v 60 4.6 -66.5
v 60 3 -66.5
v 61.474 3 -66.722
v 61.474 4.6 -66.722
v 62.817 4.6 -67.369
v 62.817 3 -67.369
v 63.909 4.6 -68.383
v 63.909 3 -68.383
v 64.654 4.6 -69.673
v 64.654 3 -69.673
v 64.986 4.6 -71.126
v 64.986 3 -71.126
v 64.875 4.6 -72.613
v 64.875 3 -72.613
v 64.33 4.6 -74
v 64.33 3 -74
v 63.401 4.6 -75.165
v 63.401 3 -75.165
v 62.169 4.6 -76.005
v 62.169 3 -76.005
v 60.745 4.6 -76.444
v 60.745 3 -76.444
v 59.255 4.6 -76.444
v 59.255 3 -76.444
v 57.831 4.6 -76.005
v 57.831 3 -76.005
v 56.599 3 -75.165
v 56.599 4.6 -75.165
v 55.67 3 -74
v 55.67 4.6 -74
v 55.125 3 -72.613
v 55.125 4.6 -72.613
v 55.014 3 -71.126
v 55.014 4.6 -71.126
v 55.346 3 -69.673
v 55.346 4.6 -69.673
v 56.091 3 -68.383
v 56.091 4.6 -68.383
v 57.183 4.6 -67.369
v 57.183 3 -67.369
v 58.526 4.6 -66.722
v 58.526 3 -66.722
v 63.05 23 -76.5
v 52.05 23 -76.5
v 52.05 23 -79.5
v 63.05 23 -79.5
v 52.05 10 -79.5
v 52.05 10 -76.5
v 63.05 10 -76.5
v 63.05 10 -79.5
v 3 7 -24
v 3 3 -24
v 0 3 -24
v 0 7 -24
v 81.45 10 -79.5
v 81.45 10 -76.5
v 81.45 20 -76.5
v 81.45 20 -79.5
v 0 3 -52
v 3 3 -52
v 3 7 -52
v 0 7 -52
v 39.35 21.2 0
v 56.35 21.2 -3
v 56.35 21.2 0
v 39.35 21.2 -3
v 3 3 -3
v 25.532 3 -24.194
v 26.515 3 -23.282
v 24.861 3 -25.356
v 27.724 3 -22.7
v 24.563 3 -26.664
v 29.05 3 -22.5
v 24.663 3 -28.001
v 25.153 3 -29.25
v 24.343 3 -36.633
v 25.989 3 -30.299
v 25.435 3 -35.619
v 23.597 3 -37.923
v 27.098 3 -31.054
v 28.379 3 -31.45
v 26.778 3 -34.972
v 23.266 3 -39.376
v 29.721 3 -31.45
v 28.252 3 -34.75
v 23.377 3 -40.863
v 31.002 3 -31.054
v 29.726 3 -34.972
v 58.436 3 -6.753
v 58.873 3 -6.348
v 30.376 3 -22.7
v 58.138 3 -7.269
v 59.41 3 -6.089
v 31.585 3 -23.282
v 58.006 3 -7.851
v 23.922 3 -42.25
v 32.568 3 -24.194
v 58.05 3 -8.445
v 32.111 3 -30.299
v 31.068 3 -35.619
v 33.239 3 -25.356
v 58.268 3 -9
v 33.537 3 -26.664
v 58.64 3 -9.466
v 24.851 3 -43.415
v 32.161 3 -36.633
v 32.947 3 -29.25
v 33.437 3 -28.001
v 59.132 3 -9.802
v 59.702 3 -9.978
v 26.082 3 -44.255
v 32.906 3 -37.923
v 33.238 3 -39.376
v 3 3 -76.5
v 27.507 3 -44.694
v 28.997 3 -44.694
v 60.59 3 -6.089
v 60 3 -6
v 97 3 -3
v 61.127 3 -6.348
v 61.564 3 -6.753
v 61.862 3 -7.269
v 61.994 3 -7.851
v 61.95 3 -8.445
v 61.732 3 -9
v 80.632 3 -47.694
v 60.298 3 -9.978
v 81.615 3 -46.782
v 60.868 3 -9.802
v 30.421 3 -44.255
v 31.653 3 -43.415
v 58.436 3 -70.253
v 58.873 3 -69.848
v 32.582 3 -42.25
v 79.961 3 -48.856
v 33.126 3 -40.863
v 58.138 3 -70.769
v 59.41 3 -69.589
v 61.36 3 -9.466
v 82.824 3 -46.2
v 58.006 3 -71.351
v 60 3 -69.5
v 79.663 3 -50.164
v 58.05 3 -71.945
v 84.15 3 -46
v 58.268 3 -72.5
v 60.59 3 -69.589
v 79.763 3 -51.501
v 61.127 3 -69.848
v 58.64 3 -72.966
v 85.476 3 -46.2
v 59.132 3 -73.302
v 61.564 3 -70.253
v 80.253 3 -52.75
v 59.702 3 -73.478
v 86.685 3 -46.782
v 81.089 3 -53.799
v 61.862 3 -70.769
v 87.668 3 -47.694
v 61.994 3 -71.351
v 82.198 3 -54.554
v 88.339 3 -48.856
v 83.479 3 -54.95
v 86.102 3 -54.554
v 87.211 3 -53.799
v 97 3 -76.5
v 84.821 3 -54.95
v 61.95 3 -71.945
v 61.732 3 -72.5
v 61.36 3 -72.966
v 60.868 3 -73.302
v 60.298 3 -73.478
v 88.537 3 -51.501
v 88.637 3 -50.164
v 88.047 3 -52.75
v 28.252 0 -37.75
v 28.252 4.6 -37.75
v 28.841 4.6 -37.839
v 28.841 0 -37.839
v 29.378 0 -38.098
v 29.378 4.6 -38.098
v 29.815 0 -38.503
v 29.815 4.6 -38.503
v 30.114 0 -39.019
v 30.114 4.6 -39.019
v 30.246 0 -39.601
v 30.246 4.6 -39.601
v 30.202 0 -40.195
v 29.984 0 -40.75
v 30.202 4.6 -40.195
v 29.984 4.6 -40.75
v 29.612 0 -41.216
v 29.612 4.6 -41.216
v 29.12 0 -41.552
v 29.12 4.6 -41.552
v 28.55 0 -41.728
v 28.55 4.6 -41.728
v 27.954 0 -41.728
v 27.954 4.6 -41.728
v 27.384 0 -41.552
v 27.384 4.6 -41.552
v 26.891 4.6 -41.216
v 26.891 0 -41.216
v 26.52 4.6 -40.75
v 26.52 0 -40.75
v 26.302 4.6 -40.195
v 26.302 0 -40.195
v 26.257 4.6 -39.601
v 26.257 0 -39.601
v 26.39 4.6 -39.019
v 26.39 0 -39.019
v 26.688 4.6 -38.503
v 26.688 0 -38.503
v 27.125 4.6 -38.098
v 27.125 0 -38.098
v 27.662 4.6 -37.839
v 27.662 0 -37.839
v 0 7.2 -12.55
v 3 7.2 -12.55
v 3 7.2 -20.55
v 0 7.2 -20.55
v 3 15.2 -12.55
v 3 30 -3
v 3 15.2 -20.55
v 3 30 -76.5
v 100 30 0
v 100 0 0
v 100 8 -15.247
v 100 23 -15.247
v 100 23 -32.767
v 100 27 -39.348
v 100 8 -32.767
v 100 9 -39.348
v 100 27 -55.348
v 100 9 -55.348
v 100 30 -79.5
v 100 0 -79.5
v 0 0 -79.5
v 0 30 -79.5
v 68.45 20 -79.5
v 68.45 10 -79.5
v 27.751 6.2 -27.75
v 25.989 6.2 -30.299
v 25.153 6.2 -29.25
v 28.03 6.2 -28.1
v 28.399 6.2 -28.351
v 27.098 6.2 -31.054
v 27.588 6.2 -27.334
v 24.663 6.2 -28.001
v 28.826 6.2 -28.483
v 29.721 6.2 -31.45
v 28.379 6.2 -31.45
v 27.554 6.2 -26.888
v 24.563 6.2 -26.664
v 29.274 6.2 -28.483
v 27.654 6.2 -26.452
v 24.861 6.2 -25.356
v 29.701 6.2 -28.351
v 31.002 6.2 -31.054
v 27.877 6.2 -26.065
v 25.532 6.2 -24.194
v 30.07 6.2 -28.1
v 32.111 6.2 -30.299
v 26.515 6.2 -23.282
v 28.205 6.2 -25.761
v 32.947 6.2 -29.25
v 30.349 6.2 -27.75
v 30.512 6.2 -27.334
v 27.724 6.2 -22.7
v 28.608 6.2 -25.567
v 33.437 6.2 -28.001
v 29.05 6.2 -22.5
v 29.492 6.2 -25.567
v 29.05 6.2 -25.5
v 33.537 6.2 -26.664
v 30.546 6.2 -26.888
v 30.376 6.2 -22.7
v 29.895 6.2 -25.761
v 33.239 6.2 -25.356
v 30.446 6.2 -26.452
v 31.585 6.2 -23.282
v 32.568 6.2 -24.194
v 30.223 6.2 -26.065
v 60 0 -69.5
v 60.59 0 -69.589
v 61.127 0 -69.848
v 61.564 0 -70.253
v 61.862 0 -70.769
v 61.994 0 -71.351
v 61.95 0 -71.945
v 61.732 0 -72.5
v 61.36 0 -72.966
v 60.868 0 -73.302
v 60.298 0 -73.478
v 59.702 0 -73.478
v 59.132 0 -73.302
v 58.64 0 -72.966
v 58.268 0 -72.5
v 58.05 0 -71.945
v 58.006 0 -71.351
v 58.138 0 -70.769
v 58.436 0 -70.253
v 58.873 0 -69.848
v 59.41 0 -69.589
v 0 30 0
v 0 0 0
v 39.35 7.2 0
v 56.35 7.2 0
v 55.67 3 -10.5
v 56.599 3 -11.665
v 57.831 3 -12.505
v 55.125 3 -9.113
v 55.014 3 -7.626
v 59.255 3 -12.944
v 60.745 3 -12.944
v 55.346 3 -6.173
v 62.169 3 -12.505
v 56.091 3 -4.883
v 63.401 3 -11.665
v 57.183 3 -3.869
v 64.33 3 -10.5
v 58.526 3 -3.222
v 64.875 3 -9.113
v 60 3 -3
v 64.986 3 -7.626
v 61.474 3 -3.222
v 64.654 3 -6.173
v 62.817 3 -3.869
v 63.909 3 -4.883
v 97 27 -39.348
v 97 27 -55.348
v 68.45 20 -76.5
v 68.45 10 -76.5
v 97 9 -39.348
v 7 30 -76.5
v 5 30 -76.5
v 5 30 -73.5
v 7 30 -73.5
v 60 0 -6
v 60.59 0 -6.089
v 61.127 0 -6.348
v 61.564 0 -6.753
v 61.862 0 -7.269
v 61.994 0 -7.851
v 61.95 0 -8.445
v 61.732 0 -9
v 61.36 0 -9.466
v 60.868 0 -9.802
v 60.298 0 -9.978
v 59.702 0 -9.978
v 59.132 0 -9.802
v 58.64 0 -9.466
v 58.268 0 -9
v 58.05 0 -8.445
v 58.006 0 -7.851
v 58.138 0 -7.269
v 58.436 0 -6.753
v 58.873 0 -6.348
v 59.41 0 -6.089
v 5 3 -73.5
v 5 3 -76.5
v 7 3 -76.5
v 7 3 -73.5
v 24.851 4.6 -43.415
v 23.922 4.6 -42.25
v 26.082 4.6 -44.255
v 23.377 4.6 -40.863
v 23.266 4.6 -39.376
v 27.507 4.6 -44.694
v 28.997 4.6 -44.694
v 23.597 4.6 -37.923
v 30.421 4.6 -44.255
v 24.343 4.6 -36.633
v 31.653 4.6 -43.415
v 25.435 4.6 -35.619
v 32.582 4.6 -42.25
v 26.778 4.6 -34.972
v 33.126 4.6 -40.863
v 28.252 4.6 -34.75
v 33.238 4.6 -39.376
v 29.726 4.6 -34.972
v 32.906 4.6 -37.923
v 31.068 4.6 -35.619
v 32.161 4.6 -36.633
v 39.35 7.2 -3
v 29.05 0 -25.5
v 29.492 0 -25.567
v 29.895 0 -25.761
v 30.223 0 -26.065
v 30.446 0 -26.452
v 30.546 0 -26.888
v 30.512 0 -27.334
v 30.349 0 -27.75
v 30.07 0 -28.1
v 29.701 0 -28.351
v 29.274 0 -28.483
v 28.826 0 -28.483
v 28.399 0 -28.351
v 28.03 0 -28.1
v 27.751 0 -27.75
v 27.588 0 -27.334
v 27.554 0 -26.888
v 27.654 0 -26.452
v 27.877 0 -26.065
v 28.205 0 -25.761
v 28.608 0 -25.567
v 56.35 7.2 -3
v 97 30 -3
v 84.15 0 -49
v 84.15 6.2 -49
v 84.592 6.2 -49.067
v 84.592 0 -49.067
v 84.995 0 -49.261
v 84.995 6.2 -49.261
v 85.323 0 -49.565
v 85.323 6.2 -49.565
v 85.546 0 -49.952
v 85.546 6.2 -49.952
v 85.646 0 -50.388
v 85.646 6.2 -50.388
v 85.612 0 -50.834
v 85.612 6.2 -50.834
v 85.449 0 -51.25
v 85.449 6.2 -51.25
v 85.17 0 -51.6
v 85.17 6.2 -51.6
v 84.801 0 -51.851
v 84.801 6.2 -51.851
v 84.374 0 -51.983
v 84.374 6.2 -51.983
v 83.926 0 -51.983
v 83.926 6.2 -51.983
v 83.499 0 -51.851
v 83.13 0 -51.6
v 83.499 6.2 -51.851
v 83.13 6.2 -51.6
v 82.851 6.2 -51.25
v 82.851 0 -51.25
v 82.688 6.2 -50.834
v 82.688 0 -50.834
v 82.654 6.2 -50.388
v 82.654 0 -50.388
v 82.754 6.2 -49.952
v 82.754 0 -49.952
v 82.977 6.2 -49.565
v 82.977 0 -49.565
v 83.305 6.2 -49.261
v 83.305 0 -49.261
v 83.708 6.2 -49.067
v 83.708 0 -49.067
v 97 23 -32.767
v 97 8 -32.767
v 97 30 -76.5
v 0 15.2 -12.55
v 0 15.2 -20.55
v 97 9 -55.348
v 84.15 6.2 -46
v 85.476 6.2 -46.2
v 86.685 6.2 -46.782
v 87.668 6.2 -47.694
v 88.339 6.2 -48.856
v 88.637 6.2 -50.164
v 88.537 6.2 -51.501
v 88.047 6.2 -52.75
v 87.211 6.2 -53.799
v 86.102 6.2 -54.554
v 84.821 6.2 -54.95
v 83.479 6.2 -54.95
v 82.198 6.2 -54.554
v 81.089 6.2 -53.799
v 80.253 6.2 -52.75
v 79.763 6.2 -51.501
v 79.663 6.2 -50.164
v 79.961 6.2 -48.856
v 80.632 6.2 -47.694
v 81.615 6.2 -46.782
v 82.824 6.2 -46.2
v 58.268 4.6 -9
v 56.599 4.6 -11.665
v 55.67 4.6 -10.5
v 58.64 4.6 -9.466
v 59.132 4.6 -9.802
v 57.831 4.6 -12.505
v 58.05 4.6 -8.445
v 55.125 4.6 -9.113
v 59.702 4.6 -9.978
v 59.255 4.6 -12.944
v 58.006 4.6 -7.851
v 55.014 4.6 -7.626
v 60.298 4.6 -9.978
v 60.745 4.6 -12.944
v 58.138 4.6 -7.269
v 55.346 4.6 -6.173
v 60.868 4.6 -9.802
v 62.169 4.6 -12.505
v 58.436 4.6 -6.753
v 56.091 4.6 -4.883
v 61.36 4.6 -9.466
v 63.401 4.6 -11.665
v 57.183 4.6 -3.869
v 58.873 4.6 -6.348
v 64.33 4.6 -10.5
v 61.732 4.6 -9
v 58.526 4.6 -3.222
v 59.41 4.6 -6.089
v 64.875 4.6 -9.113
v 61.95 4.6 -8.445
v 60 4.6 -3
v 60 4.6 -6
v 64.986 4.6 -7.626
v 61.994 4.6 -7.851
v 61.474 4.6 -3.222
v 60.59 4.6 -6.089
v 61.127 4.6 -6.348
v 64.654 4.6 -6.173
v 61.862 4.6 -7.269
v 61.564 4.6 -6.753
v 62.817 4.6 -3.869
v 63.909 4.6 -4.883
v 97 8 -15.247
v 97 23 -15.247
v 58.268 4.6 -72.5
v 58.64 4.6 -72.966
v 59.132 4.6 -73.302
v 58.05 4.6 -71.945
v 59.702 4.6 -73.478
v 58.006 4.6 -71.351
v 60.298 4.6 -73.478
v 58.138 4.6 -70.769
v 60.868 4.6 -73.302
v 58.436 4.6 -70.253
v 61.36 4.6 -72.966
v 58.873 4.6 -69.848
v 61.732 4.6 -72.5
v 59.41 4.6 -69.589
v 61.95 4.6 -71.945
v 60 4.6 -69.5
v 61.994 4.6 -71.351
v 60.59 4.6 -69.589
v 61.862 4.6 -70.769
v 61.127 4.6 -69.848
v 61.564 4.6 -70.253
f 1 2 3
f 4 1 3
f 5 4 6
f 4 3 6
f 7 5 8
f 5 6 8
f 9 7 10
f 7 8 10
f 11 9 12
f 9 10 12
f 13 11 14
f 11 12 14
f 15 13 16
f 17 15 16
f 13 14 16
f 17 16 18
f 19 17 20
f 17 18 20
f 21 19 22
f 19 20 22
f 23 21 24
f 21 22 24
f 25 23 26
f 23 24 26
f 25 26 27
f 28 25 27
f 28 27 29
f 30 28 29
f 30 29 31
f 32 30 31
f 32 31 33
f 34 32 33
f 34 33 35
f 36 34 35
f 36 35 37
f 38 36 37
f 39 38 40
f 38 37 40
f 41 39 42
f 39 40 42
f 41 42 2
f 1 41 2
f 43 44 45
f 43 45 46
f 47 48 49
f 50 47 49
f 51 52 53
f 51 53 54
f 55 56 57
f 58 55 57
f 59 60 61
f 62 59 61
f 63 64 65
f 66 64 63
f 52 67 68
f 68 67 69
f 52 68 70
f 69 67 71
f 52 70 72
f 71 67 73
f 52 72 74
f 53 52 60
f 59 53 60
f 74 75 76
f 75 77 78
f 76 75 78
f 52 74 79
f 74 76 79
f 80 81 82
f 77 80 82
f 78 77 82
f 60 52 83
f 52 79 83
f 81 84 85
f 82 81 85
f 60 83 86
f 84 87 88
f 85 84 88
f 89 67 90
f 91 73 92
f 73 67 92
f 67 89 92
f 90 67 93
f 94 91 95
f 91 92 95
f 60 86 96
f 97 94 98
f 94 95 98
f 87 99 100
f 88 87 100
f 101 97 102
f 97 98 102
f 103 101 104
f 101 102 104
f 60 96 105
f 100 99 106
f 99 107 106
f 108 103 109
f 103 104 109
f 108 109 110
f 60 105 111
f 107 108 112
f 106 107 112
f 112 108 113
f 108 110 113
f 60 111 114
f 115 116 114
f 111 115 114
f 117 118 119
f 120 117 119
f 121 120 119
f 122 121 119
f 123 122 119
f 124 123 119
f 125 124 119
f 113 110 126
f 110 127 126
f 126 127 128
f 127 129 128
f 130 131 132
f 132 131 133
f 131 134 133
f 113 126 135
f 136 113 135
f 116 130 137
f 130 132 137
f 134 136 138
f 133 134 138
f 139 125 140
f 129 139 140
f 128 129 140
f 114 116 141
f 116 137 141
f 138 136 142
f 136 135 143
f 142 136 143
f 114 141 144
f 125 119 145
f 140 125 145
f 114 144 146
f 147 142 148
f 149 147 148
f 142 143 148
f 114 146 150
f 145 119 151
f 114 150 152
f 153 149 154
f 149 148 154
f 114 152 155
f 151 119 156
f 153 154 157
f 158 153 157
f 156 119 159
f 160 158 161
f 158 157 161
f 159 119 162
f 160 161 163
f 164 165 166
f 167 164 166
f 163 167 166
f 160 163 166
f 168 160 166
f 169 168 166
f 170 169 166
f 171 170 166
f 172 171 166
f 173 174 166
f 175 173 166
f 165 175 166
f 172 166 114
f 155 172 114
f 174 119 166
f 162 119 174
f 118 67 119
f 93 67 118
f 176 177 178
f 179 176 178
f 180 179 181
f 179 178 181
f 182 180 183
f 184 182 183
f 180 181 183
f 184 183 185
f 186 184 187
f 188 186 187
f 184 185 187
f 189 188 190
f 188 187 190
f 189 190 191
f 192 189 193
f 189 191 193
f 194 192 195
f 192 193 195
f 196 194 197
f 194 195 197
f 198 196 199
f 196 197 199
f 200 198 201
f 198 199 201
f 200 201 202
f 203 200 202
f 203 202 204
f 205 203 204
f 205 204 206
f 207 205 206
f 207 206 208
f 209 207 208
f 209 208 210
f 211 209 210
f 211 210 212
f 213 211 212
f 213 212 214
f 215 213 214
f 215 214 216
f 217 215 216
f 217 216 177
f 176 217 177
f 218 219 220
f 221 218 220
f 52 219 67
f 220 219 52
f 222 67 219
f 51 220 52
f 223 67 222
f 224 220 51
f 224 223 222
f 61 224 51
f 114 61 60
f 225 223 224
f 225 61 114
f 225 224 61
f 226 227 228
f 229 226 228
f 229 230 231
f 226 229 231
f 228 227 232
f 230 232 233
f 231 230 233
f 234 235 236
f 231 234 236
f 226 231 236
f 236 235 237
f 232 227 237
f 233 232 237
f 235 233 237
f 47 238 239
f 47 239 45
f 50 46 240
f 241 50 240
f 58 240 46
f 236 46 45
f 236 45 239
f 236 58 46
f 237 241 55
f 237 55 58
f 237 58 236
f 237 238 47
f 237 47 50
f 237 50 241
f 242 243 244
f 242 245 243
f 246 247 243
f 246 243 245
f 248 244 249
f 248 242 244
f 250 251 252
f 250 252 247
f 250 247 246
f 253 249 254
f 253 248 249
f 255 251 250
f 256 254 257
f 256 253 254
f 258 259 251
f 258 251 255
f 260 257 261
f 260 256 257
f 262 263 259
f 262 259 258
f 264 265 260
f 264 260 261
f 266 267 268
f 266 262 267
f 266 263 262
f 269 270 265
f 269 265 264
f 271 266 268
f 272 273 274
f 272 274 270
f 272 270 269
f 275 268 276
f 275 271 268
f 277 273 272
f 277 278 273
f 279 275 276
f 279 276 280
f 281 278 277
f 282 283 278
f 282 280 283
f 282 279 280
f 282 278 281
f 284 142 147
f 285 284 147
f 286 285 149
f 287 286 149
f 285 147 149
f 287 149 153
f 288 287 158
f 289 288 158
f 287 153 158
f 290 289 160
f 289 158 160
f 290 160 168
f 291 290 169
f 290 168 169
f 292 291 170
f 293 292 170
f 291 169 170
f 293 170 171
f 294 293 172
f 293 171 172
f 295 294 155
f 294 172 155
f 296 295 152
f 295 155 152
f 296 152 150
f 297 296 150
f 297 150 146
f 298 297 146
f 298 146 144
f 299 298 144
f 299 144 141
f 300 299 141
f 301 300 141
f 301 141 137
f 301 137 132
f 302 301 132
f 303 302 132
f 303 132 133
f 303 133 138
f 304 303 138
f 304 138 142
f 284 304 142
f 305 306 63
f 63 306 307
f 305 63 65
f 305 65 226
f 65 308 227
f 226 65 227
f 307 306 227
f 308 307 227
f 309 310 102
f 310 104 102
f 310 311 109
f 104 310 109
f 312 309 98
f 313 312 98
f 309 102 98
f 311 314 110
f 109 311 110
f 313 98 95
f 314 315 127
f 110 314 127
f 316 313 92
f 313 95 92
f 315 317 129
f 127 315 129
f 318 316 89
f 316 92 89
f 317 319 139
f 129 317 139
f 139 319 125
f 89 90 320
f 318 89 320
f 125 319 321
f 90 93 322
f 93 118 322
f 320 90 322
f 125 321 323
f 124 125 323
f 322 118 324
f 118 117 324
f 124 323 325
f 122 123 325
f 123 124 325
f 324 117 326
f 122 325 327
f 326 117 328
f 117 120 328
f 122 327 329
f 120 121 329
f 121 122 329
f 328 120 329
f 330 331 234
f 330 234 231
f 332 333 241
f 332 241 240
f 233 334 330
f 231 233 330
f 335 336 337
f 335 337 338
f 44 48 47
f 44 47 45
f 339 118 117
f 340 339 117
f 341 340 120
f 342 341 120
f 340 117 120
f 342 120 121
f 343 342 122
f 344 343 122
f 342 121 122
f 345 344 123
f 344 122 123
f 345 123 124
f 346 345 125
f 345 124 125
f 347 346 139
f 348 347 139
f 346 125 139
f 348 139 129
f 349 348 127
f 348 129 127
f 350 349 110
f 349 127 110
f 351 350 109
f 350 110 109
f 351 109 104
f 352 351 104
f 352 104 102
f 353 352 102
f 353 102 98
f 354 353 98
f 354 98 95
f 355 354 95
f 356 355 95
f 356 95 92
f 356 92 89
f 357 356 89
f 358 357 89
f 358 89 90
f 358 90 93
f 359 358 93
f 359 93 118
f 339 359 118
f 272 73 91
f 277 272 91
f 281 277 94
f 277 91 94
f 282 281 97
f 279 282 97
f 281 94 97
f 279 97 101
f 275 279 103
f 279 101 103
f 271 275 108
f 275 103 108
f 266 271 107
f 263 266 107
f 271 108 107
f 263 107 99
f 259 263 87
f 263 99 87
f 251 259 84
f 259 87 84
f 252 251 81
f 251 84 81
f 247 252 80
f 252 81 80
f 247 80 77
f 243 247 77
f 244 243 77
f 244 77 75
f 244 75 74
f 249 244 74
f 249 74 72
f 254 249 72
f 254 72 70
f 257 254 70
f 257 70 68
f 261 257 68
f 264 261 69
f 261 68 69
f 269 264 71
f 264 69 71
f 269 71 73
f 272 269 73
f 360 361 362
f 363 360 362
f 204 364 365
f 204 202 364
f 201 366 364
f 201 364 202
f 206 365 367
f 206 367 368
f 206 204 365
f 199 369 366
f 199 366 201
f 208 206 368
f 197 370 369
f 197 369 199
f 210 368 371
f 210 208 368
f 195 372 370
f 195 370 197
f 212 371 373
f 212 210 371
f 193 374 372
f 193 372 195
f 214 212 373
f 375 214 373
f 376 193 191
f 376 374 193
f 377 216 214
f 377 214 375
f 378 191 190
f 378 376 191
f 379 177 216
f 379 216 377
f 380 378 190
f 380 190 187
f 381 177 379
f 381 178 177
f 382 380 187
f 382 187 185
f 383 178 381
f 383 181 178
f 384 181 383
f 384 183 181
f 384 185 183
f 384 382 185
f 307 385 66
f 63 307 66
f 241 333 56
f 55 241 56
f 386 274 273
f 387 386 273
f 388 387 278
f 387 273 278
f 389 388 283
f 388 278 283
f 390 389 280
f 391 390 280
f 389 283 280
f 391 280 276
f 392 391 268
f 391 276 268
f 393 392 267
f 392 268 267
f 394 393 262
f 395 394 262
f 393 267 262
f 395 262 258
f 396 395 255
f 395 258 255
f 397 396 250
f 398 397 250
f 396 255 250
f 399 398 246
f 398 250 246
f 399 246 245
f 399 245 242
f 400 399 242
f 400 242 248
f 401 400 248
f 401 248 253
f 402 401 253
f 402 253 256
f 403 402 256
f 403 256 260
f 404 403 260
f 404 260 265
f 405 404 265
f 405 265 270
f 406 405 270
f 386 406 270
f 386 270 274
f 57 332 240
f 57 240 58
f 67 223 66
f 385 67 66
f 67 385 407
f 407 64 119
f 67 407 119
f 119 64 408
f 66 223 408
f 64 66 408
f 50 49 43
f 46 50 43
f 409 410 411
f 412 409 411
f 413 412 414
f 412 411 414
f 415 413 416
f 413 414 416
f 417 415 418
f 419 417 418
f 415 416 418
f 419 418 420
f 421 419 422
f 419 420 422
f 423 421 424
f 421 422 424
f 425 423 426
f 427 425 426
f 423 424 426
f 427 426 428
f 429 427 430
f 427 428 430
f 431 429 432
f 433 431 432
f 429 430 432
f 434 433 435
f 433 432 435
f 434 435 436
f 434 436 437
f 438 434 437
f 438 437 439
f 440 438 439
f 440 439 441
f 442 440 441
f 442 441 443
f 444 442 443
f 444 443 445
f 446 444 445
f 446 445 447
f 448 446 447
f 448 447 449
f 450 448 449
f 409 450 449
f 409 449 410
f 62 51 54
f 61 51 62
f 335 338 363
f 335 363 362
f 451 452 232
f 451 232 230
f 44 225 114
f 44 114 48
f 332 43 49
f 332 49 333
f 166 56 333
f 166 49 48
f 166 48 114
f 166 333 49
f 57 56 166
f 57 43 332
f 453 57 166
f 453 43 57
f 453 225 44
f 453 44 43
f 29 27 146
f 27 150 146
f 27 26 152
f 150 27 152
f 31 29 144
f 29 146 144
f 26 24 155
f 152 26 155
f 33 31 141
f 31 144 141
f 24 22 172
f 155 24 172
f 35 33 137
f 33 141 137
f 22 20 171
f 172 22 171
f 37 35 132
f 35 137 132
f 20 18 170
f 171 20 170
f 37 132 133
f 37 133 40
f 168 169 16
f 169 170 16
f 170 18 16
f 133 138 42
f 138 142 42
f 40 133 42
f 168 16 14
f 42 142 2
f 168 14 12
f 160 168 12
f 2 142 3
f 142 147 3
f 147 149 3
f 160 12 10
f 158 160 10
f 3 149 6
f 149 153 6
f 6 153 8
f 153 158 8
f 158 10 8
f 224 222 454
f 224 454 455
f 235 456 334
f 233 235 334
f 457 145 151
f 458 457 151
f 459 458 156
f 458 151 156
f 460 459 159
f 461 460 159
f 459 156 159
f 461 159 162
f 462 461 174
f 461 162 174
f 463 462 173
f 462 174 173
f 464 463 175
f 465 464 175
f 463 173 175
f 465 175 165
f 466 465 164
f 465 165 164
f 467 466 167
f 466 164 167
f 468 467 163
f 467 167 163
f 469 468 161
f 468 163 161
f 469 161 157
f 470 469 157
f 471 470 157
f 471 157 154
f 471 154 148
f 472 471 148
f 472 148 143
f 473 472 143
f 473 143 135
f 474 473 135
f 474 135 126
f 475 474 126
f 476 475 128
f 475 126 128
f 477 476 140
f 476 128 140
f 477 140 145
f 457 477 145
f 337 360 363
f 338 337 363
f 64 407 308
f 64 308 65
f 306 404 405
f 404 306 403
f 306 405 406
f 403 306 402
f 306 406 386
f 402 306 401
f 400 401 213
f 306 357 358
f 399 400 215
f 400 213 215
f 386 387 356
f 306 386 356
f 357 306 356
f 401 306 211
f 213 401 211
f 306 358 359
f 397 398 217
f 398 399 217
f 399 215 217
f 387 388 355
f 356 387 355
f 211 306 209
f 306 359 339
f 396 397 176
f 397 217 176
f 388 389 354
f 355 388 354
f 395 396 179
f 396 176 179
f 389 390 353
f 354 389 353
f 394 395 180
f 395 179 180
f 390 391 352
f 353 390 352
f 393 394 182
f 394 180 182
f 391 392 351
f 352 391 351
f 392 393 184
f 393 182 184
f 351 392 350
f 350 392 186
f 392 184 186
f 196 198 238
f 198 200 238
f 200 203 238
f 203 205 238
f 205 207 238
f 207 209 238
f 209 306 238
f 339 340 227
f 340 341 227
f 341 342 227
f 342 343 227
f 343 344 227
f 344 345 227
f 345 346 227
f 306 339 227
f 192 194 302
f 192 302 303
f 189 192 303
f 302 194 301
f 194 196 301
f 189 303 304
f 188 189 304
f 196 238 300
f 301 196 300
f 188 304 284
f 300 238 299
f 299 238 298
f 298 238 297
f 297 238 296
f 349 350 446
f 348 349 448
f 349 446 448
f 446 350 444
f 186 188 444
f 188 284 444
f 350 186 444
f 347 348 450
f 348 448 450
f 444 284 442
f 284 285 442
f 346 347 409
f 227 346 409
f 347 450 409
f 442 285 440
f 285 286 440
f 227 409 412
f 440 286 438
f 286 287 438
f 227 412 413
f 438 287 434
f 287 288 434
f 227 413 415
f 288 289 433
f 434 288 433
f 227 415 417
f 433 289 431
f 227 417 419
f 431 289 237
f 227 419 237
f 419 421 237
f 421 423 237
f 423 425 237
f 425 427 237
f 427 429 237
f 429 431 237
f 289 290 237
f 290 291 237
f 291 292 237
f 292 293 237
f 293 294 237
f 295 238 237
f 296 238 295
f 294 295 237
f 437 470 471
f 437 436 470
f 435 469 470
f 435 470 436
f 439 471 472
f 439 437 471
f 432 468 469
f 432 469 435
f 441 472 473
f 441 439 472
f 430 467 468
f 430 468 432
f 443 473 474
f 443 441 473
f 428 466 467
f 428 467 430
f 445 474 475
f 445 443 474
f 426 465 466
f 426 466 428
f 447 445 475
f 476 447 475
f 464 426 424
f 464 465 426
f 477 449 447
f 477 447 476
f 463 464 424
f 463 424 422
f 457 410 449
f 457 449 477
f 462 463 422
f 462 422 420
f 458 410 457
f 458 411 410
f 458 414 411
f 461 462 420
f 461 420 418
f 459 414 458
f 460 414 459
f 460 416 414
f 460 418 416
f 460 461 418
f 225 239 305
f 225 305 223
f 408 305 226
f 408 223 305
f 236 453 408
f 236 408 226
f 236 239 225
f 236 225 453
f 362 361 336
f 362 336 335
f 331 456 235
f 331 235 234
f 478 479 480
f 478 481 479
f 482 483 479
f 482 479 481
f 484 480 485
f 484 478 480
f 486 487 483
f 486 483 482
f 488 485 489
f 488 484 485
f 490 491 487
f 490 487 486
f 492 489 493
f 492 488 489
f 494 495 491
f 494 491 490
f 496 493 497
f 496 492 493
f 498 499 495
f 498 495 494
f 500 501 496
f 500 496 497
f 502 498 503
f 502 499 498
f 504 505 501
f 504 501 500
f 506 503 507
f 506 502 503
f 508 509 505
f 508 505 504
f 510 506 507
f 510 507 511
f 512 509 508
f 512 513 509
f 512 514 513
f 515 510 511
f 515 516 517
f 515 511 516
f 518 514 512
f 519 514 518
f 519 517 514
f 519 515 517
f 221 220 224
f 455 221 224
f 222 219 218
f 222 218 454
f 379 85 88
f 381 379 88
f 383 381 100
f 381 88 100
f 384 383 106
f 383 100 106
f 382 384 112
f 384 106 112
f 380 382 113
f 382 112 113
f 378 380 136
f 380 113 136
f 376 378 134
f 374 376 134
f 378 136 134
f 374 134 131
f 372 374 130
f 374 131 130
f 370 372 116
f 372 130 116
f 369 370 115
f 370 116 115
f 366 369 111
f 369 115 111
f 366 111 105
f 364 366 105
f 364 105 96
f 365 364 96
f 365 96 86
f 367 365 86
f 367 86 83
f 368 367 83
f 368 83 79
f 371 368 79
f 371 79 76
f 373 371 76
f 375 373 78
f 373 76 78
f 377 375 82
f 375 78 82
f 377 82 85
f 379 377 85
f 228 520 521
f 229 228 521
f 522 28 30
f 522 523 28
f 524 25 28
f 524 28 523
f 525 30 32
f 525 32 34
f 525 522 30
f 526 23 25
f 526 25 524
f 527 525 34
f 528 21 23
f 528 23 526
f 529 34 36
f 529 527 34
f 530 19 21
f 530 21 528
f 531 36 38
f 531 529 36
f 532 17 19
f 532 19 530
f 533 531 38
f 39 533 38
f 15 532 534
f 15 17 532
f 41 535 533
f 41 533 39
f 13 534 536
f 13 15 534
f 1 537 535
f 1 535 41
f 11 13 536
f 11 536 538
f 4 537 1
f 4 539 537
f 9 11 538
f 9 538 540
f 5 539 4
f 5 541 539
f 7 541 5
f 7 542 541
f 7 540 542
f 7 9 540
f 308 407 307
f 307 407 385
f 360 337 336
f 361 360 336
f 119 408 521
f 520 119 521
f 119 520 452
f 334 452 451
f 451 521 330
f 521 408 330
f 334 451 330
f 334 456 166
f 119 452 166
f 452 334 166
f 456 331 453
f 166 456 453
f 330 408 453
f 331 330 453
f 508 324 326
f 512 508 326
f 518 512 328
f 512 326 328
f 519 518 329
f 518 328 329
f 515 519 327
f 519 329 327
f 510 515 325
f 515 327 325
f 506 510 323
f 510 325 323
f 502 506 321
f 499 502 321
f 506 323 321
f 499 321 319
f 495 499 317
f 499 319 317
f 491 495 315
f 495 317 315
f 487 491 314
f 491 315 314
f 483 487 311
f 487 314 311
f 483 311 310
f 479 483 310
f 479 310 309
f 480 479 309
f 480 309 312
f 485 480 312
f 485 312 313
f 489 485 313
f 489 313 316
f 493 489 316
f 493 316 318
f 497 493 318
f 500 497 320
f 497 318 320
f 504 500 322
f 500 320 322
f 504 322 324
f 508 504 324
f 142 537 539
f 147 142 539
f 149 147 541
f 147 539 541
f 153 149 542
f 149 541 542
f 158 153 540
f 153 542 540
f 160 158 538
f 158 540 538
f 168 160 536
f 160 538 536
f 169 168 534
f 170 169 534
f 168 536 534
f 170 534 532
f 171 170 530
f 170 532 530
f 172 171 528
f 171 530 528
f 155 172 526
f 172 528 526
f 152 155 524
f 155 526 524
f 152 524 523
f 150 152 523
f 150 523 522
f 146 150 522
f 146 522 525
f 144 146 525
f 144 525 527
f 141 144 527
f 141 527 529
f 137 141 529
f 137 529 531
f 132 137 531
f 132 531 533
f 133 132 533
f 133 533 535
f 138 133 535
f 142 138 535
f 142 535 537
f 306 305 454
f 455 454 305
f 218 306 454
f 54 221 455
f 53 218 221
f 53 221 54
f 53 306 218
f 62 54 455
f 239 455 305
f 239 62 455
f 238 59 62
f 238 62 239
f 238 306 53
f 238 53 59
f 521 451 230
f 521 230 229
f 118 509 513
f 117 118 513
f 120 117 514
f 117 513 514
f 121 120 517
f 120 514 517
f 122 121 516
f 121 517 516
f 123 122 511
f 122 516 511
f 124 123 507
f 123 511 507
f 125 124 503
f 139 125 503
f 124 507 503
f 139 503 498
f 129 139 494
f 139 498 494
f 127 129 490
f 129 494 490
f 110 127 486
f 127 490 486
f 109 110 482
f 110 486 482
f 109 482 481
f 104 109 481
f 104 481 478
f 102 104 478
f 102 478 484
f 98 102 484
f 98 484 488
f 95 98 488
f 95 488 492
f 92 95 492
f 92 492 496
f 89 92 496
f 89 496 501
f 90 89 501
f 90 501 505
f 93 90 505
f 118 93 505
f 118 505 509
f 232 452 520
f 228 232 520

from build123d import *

# Parameters (mm, degrees)
SKETCH4_W             = 100
SKETCH4_H             = 79.5
BOSS_EXTRUDE3_DEPTH   = 30
SKETCH5_W             = 94
SKETCH5_H             = 73.5
CUT_EXTRUDE1_DEPTH    = 27
SKETCH9_R             = 5
BOSS_EXTRUDE5_DEPTH   = 1.6
BOSS_EXTRUDE5_2_DEPTH = 1.6
SKETCH10_R            = 2
CUT_EXTRUDE2_DEPTH    = 131.251333966
SKETCH11_R            = 2
CUT_EXTRUDE3_DEPTH    = 131.251333966
SKETCH12_R            = 4.5
BOSS_EXTRUDE6_DEPTH   = 3.2
SKETCH13_R            = 1.5
CUT_EXTRUDE4_DEPTH    = 130.948797609
SKETCH14_R            = 1.5
CUT_EXTRUDE5_DEPTH    = 130.948797609
SKETCH15_W            = 2
SKETCH15_H            = 3
BOSS_EXTRUDE7_DEPTH   = 27
SKETCH17_W            = 28
SKETCH17_H            = 4
CUT_EXTRUDE8_DEPTH    = 22.2
SKETCH18_W            = 8
SKETCH18_H            = 8
CUT_EXTRUDE9_DEPTH    = 22.2
SKETCH19_W            = 17
SKETCH19_H            = 14
CUT_EXTRUDE11_DEPTH   = 22.2
SKETCH20_R            = 5
BOSS_EXTRUDE8_DEPTH   = 1.6
SKETCH21_R            = 2
CUT_EXTRUDE12_DEPTH   = 131.251333966
SKETCH23_W            = 13
SKETCH23_H            = 10
SKETCH23_W_2          = 11
SKETCH23_H_2          = 13
CUT_EXTRUDE13_DEPTH   = 130.430483272
SKETCH24_W            = 16
SKETCH24_H            = 18
SKETCH24_W_2          = 17.520597446
SKETCH24_H_2          = 15
CUT_EXTRUDE15_DEPTH   = 129.954449322


with BuildPart() as part:
    # Sketch4 → Boss-Extrude3 (new body)
    with BuildSketch(Plane(origin=(0, 0, 0), x_dir=(1, 0, 0), z_dir=(0, 1, 0))):
        with Locations((50, 39.75)):
            Rectangle(SKETCH4_W, SKETCH4_H)
    extrude(amount=BOSS_EXTRUDE3_DEPTH)

    # Sketch5 → Cut-Extrude1 (cut)
    with BuildSketch(Plane(origin=(0, 30, 0), x_dir=(1, 0, 0), z_dir=(0, 1, 0))):
        with Locations((50, 39.75)):
            Rectangle(SKETCH5_W, SKETCH5_H)
    extrude(amount=-CUT_EXTRUDE1_DEPTH, mode=Mode.SUBTRACT)


with BuildPart() as body_2:
    # Sketch9 → Boss-Extrude5 (new body)
    with BuildSketch(Plane(origin=(0, 3, 0), x_dir=(1, 0, 0), z_dir=(0, 1, 0))):
        with Locations(Location((60, 8, 0), (0, 0, 270))):
            Circle(SKETCH9_R)
    extrude(amount=BOSS_EXTRUDE5_DEPTH)


with BuildPart() as body_3:
    # Sketch9 → Boss-Extrude5 2 (new body)
    with BuildSketch(Plane(origin=(0, 3, 0), x_dir=(1, 0, 0), z_dir=(0, 1, 0))):
        with Locations(Location((60, 71.5, 0), (0, 0, 270))):
            Circle(SKETCH9_R)
    extrude(amount=BOSS_EXTRUDE5_2_DEPTH)


with BuildPart() as cut_extrude2_tool:
    # Sketch10 → Cut-Extrude2 (new, through all)
    with BuildSketch(Plane(origin=(0, 4.6, 0), x_dir=(1, 0, 0), z_dir=(0, 1, 0))):
        with Locations(Location((60, 71.5, 0), (0, 0, 270))):
            Circle(SKETCH10_R)
    extrude(amount=-CUT_EXTRUDE2_DEPTH)


with BuildPart() as part_1:
    add(part.part)

    # Cut-Extrude2: cut by cut_extrude2_tool
    add(cut_extrude2_tool.part, mode=Mode.SUBTRACT)


with BuildPart() as body_3_1:
    add(body_3.part)

    # Cut-Extrude2: cut by cut_extrude2_tool
    add(cut_extrude2_tool.part, mode=Mode.SUBTRACT)


with BuildPart() as cut_extrude3_tool:
    # Sketch11 → Cut-Extrude3 (new, through all)
    with BuildSketch(Plane(origin=(0, 4.6, 0), x_dir=(1, 0, 0), z_dir=(0, 1, 0))):
        with Locations(Location((60, 8, 0), (0, 0, 270))):
            Circle(SKETCH11_R)
    extrude(amount=-CUT_EXTRUDE3_DEPTH)


with BuildPart() as part_2:
    add(part_1.part)

    # Cut-Extrude3: cut by cut_extrude3_tool
    add(cut_extrude3_tool.part, mode=Mode.SUBTRACT)

    # Sketch12 → Boss-Extrude6 (add)
    with BuildSketch(Plane(origin=(0, 3, 0), x_dir=(1, 0, 0), z_dir=(0, 1, 0))):
        with Locations(Location((29.05, 27, 0), (0, 0, 270))):
            Circle(SKETCH12_R)
        with Locations(Location((84.15, 50.5, 0), (0, 0, 270))):
            Circle(SKETCH12_R)
    extrude(amount=BOSS_EXTRUDE6_DEPTH)

    # Sketch13 → Cut-Extrude4 (cut, through all)
    with BuildSketch(Plane(origin=(0, 6.2, 0), x_dir=(1, 0, 0), z_dir=(0, 1, 0))):
        with Locations(Location((29.05, 27, 0), (0, 0, 270))):
            Circle(SKETCH13_R)
    extrude(amount=-CUT_EXTRUDE4_DEPTH, mode=Mode.SUBTRACT)

    # Sketch14 → Cut-Extrude5 (cut, through all)
    with BuildSketch(Plane(origin=(0, 6.2, 0), x_dir=(1, 0, 0), z_dir=(0, 1, 0))):
        with Locations(Location((84.15, 50.5, 0), (0, 0, 270))):
            Circle(SKETCH14_R)
    extrude(amount=-CUT_EXTRUDE5_DEPTH, mode=Mode.SUBTRACT)

    # Sketch17 → Cut-Extrude8 (cut)
    with BuildSketch(Plane(origin=(3, 0, 0), x_dir=(0, 0, -1), z_dir=(1, 0, 0))):
        with Locations((38, 5)):
            Rectangle(SKETCH17_W, SKETCH17_H)
    extrude(amount=-CUT_EXTRUDE8_DEPTH, mode=Mode.SUBTRACT)

    # Sketch18 → Cut-Extrude9 (cut)
    with BuildSketch(Plane(origin=(3, 0, 0), x_dir=(0, 0, -1), z_dir=(1, 0, 0))):
        with Locations((16.55, 11.2)):
            Rectangle(SKETCH18_W, SKETCH18_H)
    extrude(amount=-CUT_EXTRUDE9_DEPTH, mode=Mode.SUBTRACT)

    # Sketch19 → Cut-Extrude11 (cut)
    with BuildSketch(Plane(origin=(0, 0, -3), x_dir=(-1, 0, 0), z_dir=(0, 0, -1))):
        with Locations((-47.85, 14.2)):
            Rectangle(SKETCH19_W, SKETCH19_H)
    extrude(amount=-CUT_EXTRUDE11_DEPTH, mode=Mode.SUBTRACT)

    # Sketch20 → Boss-Extrude8 (add)
    with BuildSketch(Plane(origin=(0, 3, 0), x_dir=(1, 0, 0), z_dir=(0, 1, 0))):
        with Locations(Location((28.251811075, 39.75, 0), (0, 0, 270))):
            Circle(SKETCH20_R)
    extrude(amount=BOSS_EXTRUDE8_DEPTH)

    # Sketch21 → Cut-Extrude12 (cut, through all)
    with BuildSketch(Plane(origin=(0, 4.6, 0), x_dir=(1, 0, 0), z_dir=(0, 1, 0))):
        with Locations(Location((28.251811075, 39.75, 0), (0, 0, 270))):
            Circle(SKETCH21_R)
    extrude(amount=-CUT_EXTRUDE12_DEPTH, mode=Mode.SUBTRACT)

    # Sketch23 → Cut-Extrude13 (cut, through all)
    with BuildSketch(Plane.XY.offset(-76.5)):
        with Locations((74.95, 15)):
            Rectangle(SKETCH23_W, SKETCH23_H)
        with Locations((57.55, 16.5)):
            Rectangle(SKETCH23_W_2, SKETCH23_H_2)
    extrude(amount=-CUT_EXTRUDE13_DEPTH, mode=Mode.SUBTRACT)

    # Sketch24 → Cut-Extrude15 (cut, through all)
    with BuildSketch(Plane.ZY.offset(-97)):
        with Locations((-47.347833479, 18)):
            Rectangle(SKETCH24_W, SKETCH24_H)
        with Locations((-24.00690671, 15.5)):
            Rectangle(SKETCH24_W_2, SKETCH24_H_2)
    extrude(amount=-CUT_EXTRUDE15_DEPTH, mode=Mode.SUBTRACT)


with BuildPart() as body_2_1:
    add(body_2.part)

    # Cut-Extrude3: cut by cut_extrude3_tool
    add(cut_extrude3_tool.part, mode=Mode.SUBTRACT)


with BuildPart() as body_4:
    # Sketch15 → Boss-Extrude7 (new body)
    with BuildSketch(Plane(origin=(0, 3, 0), x_dir=(1, 0, 0), z_dir=(0, 1, 0))):
        with Locations((6, 75)):
            Rectangle(SKETCH15_W, SKETCH15_H)
    extrude(amount=BOSS_EXTRUDE7_DEPTH)


solid = Compound([body_3_1.part, part_2.part, body_2_1.part, body_4.part])
